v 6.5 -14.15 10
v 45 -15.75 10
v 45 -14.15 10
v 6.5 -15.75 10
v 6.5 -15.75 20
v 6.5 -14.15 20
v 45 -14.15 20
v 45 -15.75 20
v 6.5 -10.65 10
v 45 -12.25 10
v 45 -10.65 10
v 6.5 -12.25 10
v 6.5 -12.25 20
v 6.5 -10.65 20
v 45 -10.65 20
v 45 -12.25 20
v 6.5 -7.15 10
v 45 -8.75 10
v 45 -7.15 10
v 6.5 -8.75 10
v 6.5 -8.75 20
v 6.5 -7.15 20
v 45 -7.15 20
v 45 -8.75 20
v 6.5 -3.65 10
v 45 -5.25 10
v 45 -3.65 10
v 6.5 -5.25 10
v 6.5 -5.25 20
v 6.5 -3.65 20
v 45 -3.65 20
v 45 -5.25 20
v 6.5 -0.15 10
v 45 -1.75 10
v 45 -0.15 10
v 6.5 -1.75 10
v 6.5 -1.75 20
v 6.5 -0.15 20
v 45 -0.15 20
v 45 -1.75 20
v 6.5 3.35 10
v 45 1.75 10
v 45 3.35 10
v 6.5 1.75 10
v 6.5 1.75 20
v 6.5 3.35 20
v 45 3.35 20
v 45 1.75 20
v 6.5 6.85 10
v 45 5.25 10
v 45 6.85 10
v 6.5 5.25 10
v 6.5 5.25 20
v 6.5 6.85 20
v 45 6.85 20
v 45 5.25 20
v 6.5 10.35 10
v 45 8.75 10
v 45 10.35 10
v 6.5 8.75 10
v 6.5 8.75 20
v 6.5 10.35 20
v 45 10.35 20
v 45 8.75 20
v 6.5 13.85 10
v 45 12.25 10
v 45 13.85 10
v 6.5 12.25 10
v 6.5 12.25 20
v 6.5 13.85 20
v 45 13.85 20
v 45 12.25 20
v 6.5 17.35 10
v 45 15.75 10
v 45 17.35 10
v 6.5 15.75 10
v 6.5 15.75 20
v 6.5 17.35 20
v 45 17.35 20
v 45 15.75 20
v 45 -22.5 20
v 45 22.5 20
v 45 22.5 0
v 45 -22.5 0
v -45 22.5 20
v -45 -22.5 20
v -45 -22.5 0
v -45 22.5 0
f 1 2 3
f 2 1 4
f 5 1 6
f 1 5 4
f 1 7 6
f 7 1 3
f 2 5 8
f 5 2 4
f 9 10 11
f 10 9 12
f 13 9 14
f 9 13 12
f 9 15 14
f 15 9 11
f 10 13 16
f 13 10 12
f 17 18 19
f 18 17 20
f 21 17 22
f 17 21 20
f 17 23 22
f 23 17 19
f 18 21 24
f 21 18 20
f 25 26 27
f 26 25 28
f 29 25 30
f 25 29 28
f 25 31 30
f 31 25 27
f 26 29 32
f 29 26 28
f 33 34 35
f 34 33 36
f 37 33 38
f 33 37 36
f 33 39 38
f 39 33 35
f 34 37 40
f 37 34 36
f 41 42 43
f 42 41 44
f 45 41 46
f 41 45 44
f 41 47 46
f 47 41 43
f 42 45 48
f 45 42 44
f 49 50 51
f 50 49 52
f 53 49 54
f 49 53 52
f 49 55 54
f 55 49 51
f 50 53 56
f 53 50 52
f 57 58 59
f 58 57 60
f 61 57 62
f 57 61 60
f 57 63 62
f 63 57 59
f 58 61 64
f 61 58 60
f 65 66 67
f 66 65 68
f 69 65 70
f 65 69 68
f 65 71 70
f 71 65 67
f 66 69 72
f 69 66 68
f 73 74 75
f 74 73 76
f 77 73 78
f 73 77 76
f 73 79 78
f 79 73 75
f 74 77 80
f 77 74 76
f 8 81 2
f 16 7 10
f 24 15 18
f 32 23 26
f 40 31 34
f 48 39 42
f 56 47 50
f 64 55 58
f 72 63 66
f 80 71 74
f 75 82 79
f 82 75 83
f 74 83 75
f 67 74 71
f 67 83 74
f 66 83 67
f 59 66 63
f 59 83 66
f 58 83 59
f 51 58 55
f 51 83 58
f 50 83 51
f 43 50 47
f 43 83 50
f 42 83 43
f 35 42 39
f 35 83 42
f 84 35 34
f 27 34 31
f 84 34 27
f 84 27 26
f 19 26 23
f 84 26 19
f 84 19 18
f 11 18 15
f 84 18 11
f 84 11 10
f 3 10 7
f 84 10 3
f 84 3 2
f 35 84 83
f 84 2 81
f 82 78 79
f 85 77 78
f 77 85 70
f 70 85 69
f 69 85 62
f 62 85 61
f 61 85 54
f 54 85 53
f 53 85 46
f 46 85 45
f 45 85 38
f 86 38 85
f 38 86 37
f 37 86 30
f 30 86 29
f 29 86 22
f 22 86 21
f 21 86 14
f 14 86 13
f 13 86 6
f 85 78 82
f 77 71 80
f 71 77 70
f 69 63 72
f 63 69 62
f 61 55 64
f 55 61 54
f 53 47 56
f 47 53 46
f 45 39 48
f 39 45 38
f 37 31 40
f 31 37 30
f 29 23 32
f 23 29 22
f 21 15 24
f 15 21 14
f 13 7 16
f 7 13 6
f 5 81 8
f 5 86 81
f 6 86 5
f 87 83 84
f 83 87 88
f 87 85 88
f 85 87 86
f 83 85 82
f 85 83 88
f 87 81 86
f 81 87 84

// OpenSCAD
// Microscope slide drying rack
// Print orientation: base block on XY plane, slots open upward (+Z)

// ---------- Block ----------
block_l = 90;    // block length along X (mm)
block_w = 45;    // block width along Y (mm)
block_h = 20;    // block height along Z (mm)

// ---------- Slots ----------
slot_n     = 10;   // number of slide slots
slot_len   = 77;   // slot length along X (mm)
slot_w     = 1.6;  // slot width along Y (mm)
slot_d     = 10;   // slot depth from top face (mm)
slot_pitch = 3.5;  // centre-to-centre spacing along Y (mm)

// ---------- Misc ----------
eps = 0.5;       // overcut past faces to avoid coplanar surfaces
$fn = 64;

// Derived
slot_x0 = -(slot_len - block_l) / 2;              // first slot start X
slot_y0 = -(slot_n - 1) * slot_pitch / 2;         // first slot centre Y

difference() {
    // Base block
    translate([-block_l / 2, -block_w / 2, 0])
        cube([block_l, block_w, block_h]);

    // Parallel slots along X, centred on block in X and Y
    for (i = [0 : slot_n - 1]) {
        translate([slot_x0, slot_y0 + i * slot_pitch, block_h - slot_d])
            cube([slot_len, slot_w, slot_d + eps]);
    }
}
